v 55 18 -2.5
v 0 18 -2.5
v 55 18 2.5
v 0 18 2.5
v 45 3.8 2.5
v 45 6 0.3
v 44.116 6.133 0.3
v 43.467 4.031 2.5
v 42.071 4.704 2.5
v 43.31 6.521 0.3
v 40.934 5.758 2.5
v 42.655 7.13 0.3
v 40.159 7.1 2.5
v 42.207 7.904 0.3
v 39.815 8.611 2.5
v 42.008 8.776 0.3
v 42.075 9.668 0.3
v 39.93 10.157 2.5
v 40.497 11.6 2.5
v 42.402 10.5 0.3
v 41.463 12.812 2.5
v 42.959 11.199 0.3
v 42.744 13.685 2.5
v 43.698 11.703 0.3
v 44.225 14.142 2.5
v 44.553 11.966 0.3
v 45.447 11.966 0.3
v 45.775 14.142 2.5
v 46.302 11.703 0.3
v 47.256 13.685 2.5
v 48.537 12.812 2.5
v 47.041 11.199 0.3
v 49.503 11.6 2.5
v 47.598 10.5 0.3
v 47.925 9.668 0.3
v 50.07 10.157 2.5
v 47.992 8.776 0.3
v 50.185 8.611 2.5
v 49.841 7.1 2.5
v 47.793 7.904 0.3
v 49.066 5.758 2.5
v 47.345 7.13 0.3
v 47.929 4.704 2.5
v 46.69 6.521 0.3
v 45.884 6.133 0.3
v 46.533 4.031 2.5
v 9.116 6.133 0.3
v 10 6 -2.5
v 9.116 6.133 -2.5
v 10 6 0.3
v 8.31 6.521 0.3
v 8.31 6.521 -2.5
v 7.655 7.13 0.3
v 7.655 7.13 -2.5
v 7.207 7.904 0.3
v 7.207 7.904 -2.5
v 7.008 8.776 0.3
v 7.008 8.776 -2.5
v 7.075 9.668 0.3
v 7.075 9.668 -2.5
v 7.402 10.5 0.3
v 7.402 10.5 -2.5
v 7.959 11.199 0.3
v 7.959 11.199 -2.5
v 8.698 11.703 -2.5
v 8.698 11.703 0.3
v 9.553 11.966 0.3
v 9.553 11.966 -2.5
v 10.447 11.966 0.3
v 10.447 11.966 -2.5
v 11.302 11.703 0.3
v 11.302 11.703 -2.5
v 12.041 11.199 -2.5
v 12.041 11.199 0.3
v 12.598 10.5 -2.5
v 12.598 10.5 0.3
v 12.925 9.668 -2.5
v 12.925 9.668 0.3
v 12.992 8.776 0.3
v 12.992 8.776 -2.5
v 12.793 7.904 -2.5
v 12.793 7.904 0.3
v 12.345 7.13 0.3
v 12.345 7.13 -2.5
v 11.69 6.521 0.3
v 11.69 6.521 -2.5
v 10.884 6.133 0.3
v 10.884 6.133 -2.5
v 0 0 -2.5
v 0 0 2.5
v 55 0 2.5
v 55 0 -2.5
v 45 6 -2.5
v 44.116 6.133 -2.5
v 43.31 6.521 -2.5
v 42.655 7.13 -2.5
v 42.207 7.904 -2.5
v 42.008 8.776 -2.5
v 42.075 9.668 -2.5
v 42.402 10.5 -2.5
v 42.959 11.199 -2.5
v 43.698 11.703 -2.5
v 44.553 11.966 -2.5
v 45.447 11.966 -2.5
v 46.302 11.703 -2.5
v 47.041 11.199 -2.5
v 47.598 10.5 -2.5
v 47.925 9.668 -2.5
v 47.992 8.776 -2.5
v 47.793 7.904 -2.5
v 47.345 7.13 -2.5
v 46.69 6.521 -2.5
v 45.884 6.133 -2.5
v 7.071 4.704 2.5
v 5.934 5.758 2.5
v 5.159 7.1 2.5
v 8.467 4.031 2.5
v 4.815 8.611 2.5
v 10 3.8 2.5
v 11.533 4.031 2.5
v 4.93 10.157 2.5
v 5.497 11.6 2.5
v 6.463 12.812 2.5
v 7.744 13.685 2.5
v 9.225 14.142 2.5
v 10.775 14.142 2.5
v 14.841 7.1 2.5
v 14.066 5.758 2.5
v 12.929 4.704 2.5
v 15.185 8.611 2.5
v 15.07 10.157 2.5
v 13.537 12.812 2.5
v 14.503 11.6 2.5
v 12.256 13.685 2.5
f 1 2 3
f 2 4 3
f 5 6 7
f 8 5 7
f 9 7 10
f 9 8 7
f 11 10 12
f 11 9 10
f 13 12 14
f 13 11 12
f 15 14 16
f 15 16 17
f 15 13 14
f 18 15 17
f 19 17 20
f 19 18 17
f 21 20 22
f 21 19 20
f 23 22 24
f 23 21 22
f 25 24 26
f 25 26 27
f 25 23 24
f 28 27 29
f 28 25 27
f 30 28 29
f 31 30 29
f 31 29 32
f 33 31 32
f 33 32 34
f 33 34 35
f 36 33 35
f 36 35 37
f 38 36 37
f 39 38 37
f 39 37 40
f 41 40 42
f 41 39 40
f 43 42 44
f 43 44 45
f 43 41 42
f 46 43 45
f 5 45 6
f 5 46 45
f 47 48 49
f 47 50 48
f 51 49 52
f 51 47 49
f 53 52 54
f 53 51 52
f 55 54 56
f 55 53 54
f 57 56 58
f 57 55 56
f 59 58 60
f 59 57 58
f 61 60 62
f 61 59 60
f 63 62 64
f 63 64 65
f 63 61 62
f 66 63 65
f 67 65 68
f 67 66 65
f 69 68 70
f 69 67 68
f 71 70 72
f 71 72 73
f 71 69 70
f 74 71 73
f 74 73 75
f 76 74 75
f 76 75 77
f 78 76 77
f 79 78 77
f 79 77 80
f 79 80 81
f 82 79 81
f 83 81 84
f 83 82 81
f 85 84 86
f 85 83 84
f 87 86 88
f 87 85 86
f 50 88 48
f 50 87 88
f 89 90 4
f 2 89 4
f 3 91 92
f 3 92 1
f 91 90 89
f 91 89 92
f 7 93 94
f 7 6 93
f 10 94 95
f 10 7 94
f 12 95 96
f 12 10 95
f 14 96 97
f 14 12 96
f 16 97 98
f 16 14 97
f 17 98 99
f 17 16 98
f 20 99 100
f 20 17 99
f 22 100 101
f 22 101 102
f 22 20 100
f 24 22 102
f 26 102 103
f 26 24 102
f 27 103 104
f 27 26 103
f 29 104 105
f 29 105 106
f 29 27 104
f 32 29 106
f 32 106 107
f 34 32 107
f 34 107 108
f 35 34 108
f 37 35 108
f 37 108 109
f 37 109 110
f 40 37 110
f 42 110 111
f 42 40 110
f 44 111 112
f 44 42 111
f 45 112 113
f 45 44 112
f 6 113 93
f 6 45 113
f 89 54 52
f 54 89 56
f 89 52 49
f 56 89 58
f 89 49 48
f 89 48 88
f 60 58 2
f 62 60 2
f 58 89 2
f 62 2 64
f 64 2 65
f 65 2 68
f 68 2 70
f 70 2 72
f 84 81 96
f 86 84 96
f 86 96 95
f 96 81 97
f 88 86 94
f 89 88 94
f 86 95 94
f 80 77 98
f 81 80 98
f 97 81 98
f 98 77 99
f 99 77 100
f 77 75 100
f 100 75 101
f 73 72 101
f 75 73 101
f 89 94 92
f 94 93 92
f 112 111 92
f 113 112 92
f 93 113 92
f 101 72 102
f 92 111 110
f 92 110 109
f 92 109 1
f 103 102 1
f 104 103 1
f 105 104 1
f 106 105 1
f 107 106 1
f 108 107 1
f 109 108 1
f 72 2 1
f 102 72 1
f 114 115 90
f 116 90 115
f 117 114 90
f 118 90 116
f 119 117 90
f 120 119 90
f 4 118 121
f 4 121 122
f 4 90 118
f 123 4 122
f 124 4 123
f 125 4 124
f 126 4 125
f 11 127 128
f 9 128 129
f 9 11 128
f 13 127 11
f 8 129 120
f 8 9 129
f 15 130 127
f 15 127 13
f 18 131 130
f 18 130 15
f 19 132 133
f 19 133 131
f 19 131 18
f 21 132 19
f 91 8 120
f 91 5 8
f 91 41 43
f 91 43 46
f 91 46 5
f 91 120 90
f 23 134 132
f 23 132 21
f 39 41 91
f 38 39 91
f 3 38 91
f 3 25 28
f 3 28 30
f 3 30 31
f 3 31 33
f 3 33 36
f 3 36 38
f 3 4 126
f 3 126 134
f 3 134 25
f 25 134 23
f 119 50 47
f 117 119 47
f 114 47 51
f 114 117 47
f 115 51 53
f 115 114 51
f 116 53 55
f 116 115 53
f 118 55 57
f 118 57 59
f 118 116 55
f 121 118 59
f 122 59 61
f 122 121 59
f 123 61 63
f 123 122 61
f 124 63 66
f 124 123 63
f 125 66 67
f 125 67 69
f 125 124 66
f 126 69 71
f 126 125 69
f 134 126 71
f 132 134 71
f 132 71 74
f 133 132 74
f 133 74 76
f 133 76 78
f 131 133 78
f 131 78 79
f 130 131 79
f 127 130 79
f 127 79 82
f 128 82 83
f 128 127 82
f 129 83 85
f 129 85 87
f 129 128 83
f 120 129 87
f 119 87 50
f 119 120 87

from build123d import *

# Parameters (mm, degrees)
SKETCH2_W                      = 55
SKETCH2_H                      = 18
BOSS_EXTRUDE1_DEPTH            = 2.5
F_6_0MM_DOWEL_HOLE1_AT_2_COUNT = 2
F_6_0MM_DOWEL_HOLE1_AT_2_PITCH = 35


with BuildPart() as part:
    # Sketch2 → Boss-Extrude1 (new body, symmetric)
    with BuildSketch(Plane.XY):
        with Locations((27.5, 9)):
            Rectangle(SKETCH2_W, SKETCH2_H)
    extrude(amount=BOSS_EXTRUDE1_DEPTH, both=True)

    # Sketch3 → Ø6.0mm Dowel Hole1 (revolve, cut)
    with BuildSketch(Plane(origin=(10, 9, 2.5), x_dir=(0, -1, 0), z_dir=(1, 0, 0))):
        Polygon((0, 0), (0, 5), (3, 5), (3, 2.2), (5.2, 0), align=None)
    f_6_0mm_dowel_hole1 = revolve(axis=Axis((10, 9, 8.85), (0, 0, -1)), mode=Mode.SUBTRACT)

    # Ø6.0mm Dowel Hole1 at 2: Ø6.0mm Dowel Hole1 ×2
    with Locations(*[(i * F_6_0MM_DOWEL_HOLE1_AT_2_PITCH, 0, 0) for i in range(1, F_6_0MM_DOWEL_HOLE1_AT_2_COUNT)]):
        add(f_6_0mm_dowel_hole1, mode=Mode.SUBTRACT)


solid = part.part
